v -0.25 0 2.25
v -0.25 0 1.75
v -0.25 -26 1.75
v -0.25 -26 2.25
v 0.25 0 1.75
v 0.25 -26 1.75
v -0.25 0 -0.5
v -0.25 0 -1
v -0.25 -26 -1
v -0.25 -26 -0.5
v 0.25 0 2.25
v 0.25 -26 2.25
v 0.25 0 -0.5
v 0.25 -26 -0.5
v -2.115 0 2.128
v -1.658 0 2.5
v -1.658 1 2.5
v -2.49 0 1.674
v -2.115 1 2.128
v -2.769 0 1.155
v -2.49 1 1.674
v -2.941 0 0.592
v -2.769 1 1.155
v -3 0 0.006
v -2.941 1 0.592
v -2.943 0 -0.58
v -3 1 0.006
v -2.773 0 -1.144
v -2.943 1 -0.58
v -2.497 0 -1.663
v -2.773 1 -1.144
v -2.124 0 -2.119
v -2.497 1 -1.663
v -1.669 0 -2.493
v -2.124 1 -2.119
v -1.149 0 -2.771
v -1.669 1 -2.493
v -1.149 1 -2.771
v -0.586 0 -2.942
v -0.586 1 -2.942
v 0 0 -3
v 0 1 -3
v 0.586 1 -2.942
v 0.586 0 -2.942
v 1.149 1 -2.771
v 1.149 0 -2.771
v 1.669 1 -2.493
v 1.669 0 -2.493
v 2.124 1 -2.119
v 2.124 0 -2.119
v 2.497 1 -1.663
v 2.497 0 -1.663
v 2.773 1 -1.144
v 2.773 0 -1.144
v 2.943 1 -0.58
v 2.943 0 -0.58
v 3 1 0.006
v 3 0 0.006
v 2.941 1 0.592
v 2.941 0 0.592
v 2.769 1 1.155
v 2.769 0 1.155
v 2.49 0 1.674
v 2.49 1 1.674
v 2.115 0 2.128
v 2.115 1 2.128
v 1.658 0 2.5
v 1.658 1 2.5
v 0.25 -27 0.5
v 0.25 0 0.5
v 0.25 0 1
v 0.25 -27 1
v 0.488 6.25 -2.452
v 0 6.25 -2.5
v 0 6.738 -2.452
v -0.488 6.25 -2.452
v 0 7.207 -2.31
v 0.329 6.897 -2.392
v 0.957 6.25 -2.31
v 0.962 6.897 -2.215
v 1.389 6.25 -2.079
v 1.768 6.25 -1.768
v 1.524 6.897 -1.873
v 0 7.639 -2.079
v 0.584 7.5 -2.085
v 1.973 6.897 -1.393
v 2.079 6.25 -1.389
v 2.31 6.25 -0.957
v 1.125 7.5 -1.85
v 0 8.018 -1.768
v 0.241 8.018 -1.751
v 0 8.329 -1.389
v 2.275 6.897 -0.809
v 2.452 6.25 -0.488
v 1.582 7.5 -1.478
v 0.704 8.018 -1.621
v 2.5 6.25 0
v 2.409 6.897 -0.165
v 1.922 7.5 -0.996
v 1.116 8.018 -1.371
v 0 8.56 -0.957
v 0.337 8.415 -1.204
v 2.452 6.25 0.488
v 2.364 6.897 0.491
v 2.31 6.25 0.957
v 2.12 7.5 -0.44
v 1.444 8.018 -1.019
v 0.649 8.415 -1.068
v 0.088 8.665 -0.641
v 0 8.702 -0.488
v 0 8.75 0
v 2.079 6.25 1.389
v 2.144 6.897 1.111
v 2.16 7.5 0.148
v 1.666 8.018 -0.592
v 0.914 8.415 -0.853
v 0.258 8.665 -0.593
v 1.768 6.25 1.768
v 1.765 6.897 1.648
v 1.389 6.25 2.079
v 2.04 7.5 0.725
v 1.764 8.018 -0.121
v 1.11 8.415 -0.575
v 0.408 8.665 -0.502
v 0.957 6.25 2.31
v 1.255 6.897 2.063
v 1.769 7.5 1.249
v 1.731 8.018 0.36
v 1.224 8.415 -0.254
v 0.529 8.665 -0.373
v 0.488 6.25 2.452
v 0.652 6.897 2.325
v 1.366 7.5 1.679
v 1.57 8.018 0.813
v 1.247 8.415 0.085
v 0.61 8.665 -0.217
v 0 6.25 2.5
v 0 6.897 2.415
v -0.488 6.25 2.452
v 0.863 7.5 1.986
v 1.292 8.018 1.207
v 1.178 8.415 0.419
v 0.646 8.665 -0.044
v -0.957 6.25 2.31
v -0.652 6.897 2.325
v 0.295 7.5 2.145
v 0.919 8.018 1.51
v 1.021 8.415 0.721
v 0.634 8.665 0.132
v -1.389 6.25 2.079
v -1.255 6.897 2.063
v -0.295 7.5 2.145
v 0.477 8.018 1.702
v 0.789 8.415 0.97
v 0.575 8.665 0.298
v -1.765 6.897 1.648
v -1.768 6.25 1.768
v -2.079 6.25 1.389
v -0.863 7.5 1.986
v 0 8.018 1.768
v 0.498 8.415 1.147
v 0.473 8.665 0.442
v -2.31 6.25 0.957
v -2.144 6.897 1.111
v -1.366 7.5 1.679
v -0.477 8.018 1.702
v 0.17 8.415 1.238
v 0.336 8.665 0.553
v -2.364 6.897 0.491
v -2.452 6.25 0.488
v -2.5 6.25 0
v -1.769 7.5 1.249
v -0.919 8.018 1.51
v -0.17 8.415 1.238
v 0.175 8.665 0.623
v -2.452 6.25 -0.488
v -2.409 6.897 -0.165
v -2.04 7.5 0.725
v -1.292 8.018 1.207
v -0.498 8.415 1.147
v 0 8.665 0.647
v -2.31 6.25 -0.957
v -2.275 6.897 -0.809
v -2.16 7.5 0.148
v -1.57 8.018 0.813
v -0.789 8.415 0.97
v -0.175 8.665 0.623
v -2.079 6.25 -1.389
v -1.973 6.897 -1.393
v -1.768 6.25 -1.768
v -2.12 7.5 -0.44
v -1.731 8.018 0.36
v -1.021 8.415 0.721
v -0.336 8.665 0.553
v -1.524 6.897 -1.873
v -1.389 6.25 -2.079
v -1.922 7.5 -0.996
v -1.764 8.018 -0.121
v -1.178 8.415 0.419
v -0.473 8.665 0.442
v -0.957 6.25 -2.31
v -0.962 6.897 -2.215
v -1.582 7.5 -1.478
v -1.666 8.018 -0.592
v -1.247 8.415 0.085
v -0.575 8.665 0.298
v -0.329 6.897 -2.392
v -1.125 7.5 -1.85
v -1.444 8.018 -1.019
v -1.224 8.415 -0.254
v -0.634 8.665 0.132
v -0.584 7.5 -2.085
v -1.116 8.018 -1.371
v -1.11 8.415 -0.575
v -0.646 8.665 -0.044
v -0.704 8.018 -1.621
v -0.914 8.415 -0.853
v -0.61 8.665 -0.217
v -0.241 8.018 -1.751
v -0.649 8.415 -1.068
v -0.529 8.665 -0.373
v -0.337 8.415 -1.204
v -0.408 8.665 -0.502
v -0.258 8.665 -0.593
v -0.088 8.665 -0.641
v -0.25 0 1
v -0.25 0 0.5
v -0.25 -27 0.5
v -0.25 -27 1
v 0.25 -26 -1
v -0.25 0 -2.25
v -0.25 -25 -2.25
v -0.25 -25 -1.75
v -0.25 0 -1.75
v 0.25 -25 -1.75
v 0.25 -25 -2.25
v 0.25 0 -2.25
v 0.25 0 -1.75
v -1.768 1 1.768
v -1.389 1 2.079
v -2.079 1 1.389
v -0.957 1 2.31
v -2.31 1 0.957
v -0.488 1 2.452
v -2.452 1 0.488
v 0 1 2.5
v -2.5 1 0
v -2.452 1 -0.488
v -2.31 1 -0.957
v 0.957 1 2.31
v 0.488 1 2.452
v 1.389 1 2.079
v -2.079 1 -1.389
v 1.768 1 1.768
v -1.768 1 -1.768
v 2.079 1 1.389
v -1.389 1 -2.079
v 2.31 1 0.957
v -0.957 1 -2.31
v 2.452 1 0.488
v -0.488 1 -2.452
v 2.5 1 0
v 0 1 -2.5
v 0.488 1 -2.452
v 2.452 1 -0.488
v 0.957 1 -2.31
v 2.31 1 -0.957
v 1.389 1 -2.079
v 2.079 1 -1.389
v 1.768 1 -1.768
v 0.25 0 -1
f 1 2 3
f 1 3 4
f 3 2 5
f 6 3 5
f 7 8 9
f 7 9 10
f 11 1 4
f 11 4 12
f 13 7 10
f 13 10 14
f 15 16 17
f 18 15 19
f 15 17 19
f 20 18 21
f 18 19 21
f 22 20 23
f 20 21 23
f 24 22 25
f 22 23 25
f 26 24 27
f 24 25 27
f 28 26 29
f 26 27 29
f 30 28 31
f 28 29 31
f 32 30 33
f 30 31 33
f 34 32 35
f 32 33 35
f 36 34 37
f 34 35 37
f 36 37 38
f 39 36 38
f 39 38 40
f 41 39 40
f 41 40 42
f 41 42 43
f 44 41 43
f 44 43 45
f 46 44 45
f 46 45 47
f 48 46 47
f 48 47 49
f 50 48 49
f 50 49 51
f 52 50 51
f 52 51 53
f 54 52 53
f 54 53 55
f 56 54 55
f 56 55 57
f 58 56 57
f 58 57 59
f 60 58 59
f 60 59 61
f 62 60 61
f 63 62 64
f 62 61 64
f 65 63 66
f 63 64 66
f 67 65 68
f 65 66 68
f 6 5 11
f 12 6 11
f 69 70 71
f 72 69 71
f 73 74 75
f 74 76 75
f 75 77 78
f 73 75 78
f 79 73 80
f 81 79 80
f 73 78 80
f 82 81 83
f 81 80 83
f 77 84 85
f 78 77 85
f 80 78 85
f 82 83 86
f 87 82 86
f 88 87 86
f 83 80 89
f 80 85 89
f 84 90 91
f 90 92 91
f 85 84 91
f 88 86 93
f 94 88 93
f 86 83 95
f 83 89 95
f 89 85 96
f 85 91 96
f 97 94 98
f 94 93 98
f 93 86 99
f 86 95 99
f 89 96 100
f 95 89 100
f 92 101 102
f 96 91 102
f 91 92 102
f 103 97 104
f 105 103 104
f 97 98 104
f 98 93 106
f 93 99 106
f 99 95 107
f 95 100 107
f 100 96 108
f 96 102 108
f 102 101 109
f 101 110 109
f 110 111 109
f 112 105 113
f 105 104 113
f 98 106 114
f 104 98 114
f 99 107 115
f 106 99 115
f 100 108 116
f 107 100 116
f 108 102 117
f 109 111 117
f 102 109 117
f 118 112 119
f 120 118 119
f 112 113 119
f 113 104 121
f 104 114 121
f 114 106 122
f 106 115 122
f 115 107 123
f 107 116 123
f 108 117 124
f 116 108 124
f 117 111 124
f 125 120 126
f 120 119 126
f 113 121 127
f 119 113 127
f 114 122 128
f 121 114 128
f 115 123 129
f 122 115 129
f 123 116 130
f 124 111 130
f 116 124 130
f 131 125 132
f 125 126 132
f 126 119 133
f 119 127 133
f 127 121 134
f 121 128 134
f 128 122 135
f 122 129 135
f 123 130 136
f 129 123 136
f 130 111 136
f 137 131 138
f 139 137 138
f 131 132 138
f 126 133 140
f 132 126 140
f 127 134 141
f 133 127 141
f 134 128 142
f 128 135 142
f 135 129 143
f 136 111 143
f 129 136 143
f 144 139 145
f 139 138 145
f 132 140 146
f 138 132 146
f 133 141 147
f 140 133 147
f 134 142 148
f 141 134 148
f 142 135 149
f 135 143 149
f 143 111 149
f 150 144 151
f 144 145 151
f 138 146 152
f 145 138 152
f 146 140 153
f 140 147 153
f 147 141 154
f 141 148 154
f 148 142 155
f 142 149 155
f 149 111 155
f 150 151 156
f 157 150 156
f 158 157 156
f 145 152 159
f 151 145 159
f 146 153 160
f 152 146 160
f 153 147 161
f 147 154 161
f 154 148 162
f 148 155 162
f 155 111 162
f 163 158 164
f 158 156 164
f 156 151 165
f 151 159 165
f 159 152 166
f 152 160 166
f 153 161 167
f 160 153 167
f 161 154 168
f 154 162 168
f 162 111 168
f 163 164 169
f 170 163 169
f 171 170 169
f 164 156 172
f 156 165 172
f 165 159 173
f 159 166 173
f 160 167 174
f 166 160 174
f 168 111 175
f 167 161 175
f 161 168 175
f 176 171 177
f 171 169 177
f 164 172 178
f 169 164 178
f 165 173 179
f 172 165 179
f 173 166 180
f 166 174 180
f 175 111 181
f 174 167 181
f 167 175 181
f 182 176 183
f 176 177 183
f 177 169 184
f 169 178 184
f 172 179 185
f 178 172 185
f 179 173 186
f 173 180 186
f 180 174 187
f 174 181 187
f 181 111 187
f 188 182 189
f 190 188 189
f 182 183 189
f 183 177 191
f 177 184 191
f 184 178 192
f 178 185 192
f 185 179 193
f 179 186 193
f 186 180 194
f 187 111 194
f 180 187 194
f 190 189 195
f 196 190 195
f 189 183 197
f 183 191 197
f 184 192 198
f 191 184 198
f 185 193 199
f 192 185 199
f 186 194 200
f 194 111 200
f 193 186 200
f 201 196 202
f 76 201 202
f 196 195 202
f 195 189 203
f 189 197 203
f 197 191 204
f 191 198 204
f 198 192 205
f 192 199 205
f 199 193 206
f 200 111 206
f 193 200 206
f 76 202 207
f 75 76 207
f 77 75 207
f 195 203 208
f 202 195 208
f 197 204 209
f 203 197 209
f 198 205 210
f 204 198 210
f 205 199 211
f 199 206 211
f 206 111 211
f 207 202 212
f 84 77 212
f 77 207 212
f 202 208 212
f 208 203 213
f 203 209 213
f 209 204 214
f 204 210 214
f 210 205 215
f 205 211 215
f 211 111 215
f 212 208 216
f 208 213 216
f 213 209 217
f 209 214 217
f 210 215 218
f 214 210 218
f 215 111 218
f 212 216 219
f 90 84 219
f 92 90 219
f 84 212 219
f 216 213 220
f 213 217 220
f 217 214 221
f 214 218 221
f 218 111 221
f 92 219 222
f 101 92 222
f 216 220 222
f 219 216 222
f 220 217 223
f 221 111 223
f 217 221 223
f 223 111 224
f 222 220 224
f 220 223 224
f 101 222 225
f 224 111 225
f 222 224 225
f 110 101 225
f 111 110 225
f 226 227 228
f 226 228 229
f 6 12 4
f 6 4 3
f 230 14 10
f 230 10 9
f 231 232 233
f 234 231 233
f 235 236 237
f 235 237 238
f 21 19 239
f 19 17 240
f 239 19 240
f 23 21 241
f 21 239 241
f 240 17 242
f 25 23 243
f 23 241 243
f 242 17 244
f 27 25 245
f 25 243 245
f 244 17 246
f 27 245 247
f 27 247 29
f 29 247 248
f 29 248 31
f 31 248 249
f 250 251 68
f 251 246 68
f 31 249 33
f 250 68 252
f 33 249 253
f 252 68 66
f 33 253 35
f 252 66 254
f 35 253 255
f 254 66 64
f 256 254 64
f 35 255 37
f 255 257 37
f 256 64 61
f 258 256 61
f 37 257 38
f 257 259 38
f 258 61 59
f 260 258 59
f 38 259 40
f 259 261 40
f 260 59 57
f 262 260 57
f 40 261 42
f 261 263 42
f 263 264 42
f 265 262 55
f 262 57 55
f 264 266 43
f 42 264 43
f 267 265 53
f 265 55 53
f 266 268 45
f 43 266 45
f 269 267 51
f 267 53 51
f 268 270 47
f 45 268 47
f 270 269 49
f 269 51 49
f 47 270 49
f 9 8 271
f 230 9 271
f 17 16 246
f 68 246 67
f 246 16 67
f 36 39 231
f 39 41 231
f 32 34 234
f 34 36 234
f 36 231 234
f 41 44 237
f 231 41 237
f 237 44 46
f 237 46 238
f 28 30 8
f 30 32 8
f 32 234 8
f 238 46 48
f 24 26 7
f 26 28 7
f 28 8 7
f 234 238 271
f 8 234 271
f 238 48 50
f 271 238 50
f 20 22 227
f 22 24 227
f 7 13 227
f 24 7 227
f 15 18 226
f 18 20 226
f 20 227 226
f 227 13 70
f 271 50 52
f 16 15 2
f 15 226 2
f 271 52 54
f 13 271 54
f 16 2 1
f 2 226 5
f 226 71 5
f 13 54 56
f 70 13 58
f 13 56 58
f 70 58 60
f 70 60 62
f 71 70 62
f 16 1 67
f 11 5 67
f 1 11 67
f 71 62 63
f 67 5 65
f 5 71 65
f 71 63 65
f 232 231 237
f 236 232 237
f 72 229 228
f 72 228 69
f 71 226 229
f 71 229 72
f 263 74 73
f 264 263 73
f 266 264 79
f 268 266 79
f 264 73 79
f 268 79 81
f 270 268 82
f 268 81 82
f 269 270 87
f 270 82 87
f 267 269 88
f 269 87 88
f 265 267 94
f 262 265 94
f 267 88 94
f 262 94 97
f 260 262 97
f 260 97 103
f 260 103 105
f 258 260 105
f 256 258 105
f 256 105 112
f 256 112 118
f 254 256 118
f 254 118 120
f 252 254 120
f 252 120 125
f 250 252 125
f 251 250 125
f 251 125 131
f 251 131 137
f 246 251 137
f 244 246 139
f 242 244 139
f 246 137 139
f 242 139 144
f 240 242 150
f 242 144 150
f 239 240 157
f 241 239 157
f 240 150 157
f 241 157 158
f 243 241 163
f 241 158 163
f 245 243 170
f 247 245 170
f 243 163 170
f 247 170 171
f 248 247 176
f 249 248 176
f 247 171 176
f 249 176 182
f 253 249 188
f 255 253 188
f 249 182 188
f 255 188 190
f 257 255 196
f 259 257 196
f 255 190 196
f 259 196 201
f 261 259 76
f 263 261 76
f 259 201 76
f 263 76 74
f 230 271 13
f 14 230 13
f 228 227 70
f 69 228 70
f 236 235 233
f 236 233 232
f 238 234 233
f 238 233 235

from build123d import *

# Parameters (mm, degrees)
CUT_EXTRUDE2_DEPTH      = 10
SKETCH3_W               = 0.5
SKETCH3_H               = 0.5
BOSS_EXTRUDE1_DEPTH     = 27
SKETCH5_W               = 0.5
SKETCH5_H               = 1
CUT_EXTRUDE3_DEPTH      = 4
CUT_EXTRUDE3_DEPTH_BACK = 4
SKETCH7_W               = 0.5
SKETCH7_H               = 2
CUT_EXTRUDE4_DEPTH      = 4
CUT_EXTRUDE4_DEPTH_BACK = 4


with BuildPart() as part:
    # Sketch1 → Revolve1 (revolve)
    with BuildSketch(Plane(origin=(0, 0, 0), x_dir=(0, 0, -1), z_dir=(1, 0, 0))):
        with BuildLine():
            Line((0, 0), (3, 0))
            Line((3, 0), (3, 1))
            Line((3, 1), (2.5, 1))
            Line((2.5, 1), (2.5, 6.25))
            ThreePointArc((2.5, 6.25), (1.767766953, 8.017766953), (0, 8.75))
            Line((0, 8.75), (0, 0))
        make_face()
    revolve(axis=Axis((0, 8.75, 0), (0, -1, 0)))

    # Sketch2 → Cut-Extrude2 (cut)
    with BuildSketch(Plane(origin=(0, 0, 0), x_dir=(1, 0, 0), z_dir=(0, 1, 0))):
        with BuildLine():
            Line((-1.658312395, -2.5), (1.658312395, -2.5))
            ThreePointArc((1.658312395, -2.5), (0, -3), (-1.658312395, -2.5))
        make_face()
    extrude(amount=CUT_EXTRUDE2_DEPTH, mode=Mode.SUBTRACT)

    # Sketch3 → Boss-Extrude1 (add)
    with BuildSketch(Plane.XZ):
        with Locations((0, 2)):
            Rectangle(SKETCH3_W, SKETCH3_H)
        with Locations((0, 0.75)):
            Rectangle(SKETCH3_W, SKETCH3_H)
        with Locations((0, -0.75)):
            Rectangle(SKETCH3_W, SKETCH3_H)
        with Locations((0, -2)):
            Rectangle(SKETCH3_W, SKETCH3_H)
    extrude(amount=BOSS_EXTRUDE1_DEPTH)

    # Sketch5 → Cut-Extrude3 (cut, two sides)
    with BuildSketch(Plane(origin=(0, 0, 0), x_dir=(0, 0, -1), z_dir=(1, 0, 0))) as cut_extrude3_sk:
        with Locations((-2, -26.5)):
            Rectangle(SKETCH5_W, SKETCH5_H)
        with Locations((0.75, -26.5)):
            Rectangle(SKETCH5_W, SKETCH5_H)
    extrude(amount=CUT_EXTRUDE3_DEPTH, mode=Mode.SUBTRACT)
    extrude(cut_extrude3_sk.sketch, amount=-CUT_EXTRUDE3_DEPTH_BACK, mode=Mode.SUBTRACT)

    # Sketch7 → Cut-Extrude4 (cut, two sides)
    with BuildSketch(Plane(origin=(0, 0, 0), x_dir=(0, 0, -1), z_dir=(1, 0, 0))) as cut_extrude4_sk:
        with Locations((2, -26)):
            Rectangle(SKETCH7_W, SKETCH7_H)
    extrude(amount=CUT_EXTRUDE4_DEPTH, mode=Mode.SUBTRACT)
    extrude(cut_extrude4_sk.sketch, amount=-CUT_EXTRUDE4_DEPTH_BACK, mode=Mode.SUBTRACT)


solid = part.part
